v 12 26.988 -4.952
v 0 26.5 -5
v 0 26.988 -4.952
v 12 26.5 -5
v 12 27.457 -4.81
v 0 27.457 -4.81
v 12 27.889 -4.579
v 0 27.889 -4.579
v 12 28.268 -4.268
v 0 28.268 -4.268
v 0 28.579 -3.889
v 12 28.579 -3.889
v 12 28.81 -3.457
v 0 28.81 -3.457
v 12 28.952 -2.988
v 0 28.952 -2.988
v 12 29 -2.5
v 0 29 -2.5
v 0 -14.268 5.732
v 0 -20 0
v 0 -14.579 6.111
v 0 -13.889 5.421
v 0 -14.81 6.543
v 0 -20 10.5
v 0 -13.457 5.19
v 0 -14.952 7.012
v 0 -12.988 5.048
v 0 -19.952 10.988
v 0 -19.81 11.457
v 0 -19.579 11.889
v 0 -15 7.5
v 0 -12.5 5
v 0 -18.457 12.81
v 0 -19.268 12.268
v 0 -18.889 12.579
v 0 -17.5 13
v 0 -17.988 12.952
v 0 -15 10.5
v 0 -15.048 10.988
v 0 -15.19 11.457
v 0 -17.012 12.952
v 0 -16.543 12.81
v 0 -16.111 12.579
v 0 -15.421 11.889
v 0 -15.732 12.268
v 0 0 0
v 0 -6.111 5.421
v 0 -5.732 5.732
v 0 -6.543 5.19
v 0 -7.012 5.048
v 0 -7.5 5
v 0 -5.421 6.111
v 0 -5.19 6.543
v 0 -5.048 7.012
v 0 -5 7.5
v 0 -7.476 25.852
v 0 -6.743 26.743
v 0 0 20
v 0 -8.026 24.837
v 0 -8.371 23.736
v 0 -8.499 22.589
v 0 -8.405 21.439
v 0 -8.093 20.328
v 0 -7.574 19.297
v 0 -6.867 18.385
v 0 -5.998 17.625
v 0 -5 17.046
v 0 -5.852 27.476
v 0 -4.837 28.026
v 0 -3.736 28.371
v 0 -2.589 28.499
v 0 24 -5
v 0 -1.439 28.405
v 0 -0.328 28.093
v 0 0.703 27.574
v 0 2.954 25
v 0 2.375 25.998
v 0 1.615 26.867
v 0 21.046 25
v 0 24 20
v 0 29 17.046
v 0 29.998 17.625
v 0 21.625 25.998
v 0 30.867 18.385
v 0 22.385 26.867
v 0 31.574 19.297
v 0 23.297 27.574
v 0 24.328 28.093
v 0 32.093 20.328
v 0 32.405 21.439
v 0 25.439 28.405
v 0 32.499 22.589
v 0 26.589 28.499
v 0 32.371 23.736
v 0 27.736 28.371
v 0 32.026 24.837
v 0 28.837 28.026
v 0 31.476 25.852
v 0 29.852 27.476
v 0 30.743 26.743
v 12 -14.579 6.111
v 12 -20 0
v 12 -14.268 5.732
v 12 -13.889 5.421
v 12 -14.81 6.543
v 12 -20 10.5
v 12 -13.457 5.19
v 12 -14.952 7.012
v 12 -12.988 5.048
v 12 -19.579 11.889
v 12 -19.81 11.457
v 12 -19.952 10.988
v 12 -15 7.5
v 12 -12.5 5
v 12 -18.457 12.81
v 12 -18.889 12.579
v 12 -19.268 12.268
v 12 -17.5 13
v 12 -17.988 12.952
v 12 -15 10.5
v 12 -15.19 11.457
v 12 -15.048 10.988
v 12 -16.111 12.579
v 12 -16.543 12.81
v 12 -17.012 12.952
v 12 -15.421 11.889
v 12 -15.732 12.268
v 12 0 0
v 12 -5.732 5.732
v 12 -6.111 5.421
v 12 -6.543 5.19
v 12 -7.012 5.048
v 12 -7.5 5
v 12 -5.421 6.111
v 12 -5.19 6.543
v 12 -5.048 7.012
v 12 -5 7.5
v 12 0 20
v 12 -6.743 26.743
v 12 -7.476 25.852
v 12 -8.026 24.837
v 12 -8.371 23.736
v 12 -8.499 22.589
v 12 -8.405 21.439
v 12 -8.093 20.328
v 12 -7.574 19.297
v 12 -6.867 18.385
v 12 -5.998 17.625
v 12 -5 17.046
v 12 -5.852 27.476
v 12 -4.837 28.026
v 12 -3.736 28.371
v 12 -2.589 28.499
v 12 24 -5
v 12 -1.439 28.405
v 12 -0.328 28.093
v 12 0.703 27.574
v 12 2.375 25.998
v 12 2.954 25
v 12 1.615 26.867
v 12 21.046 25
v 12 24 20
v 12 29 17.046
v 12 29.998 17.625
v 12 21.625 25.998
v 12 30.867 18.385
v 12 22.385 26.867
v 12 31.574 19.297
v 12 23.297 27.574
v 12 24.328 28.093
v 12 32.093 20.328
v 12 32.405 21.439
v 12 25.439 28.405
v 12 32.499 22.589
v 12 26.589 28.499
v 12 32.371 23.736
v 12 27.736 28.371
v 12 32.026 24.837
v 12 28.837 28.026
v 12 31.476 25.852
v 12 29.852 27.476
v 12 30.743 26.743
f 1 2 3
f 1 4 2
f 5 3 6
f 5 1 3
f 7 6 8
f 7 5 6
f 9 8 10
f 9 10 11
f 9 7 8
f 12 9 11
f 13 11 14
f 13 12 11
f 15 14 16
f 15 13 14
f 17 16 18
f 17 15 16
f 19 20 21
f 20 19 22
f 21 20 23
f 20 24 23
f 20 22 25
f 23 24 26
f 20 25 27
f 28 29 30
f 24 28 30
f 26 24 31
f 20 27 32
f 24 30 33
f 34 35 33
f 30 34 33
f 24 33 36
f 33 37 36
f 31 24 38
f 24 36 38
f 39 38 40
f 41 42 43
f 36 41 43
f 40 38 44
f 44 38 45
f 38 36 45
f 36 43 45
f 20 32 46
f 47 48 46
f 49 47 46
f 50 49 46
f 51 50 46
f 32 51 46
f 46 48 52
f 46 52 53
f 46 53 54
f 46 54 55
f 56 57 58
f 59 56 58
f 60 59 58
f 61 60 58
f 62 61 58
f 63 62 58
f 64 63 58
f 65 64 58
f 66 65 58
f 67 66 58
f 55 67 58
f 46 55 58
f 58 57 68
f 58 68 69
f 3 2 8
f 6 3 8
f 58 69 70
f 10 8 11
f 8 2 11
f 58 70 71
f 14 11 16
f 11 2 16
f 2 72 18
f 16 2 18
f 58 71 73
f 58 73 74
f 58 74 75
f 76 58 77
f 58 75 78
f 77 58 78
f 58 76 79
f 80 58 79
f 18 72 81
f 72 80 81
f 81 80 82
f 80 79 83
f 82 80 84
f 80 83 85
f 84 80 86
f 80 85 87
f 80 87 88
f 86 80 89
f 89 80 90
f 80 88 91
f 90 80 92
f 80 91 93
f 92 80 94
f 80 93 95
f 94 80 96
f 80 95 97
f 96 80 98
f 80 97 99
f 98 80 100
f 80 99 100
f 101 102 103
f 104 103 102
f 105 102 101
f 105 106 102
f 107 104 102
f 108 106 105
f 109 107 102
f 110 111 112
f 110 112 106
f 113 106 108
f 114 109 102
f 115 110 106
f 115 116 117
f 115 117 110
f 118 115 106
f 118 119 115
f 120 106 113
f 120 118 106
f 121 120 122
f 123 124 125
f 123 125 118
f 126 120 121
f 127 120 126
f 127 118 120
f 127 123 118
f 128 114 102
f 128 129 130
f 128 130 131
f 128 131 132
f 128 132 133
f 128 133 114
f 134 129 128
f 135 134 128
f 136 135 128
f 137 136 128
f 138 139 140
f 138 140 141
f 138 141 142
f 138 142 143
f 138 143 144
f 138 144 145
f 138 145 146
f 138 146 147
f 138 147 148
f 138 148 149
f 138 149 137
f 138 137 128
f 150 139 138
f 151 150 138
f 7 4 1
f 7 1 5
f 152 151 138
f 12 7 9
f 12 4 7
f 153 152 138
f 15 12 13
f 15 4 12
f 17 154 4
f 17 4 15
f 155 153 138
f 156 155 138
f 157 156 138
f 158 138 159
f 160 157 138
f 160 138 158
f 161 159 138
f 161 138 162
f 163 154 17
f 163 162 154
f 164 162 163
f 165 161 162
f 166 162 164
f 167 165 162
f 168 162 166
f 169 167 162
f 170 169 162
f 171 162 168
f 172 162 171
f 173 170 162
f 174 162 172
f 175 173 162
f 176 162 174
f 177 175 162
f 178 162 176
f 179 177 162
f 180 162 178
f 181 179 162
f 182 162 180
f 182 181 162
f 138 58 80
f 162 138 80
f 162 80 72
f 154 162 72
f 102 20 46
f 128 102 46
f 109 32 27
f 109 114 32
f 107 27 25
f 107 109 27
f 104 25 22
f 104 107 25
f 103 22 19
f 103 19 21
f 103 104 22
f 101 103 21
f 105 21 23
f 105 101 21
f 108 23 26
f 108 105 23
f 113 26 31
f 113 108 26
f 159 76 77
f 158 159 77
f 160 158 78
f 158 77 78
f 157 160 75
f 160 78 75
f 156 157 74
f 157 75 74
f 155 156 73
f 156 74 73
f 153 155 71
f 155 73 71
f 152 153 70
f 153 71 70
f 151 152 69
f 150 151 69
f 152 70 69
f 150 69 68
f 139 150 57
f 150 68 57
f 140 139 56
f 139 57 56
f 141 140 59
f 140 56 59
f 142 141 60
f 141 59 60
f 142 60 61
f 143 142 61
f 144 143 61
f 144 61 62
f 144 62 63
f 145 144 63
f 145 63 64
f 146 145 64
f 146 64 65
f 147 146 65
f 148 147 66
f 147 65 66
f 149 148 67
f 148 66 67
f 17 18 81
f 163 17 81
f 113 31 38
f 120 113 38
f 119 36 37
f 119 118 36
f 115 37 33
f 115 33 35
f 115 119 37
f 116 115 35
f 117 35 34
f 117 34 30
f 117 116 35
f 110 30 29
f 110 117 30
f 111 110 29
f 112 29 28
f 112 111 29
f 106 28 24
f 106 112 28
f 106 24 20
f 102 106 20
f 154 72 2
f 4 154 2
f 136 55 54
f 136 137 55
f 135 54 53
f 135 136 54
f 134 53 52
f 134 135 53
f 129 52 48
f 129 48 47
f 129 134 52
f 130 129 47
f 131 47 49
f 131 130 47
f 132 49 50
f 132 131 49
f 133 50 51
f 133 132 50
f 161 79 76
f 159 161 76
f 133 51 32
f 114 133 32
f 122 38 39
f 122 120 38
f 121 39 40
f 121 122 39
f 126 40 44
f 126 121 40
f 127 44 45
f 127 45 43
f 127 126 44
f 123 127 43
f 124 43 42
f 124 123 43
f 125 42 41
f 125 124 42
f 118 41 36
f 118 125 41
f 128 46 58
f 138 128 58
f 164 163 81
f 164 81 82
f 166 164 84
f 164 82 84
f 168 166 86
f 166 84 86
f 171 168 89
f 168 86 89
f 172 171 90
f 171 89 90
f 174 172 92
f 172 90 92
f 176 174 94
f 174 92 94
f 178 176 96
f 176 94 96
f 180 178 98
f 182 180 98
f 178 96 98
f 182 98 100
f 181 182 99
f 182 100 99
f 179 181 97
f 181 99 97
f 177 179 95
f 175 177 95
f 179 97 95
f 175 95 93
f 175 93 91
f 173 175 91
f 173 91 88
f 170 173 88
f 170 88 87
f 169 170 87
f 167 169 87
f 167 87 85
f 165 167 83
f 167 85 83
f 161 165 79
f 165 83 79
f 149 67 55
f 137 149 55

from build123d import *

# Parameters (mm, degrees)
F1_DEPTH = 12
F2_R     = 2.49999


# Not quite as in the source:
# - a fillet or chamfer is up to 0.001 mm smaller than in the source, because OpenCascade refuses the exact size


with BuildPart() as f1:
    # F0 (on Right) → F1 (new body)
    with BuildSketch(Plane.YZ):
        Polygon((-20, 0), (0, 0), (0, 20), (-5, 25), (-5, 17.0456439427), (-5, 5), (-15, 5), (-15, 13), (-20, 13), align=None)
        Polygon((-5, 25), (0, 20), (24, 20), (29, 25), (21.0456439427, 25), (2.9543560573, 25), align=None)
        Polygon((29, 25), (24, 20), (24, -5), (29, -5), (29, 17.0456439427), align=None)
        with BuildLine():
            Line((-5, 17.0456439427), (-5, 25))
            Line((-5, 25), (2.9543560573, 25))
            ThreePointArc((2.9543560573, 25), (-6.7426406871, 26.7426406871), (-5, 17.0456439427))
        make_face()
        with BuildLine():
            Line((21.0456439427, 25), (29, 25))
            Line((29, 25), (29, 17.0456439427))
            ThreePointArc((29, 17.0456439427), (30.7426406871, 26.7426406871), (21.0456439427, 25))
        make_face()
    extrude(amount=F1_DEPTH)

    # F2 (radius 2.5 in the source; OpenCascade refuses exactly that, so slightly less here)
    f2_edges = [f1.edges().sort_by_distance(p)[0] for p in [
        (6, -5, 5),
        (6, -15, 5),
        (6, 29, -5),
        (6, -20, 13),
        (6, -15, 13),
    ]]
    fillet(f2_edges, radius=F2_R)


solid = f1.part
